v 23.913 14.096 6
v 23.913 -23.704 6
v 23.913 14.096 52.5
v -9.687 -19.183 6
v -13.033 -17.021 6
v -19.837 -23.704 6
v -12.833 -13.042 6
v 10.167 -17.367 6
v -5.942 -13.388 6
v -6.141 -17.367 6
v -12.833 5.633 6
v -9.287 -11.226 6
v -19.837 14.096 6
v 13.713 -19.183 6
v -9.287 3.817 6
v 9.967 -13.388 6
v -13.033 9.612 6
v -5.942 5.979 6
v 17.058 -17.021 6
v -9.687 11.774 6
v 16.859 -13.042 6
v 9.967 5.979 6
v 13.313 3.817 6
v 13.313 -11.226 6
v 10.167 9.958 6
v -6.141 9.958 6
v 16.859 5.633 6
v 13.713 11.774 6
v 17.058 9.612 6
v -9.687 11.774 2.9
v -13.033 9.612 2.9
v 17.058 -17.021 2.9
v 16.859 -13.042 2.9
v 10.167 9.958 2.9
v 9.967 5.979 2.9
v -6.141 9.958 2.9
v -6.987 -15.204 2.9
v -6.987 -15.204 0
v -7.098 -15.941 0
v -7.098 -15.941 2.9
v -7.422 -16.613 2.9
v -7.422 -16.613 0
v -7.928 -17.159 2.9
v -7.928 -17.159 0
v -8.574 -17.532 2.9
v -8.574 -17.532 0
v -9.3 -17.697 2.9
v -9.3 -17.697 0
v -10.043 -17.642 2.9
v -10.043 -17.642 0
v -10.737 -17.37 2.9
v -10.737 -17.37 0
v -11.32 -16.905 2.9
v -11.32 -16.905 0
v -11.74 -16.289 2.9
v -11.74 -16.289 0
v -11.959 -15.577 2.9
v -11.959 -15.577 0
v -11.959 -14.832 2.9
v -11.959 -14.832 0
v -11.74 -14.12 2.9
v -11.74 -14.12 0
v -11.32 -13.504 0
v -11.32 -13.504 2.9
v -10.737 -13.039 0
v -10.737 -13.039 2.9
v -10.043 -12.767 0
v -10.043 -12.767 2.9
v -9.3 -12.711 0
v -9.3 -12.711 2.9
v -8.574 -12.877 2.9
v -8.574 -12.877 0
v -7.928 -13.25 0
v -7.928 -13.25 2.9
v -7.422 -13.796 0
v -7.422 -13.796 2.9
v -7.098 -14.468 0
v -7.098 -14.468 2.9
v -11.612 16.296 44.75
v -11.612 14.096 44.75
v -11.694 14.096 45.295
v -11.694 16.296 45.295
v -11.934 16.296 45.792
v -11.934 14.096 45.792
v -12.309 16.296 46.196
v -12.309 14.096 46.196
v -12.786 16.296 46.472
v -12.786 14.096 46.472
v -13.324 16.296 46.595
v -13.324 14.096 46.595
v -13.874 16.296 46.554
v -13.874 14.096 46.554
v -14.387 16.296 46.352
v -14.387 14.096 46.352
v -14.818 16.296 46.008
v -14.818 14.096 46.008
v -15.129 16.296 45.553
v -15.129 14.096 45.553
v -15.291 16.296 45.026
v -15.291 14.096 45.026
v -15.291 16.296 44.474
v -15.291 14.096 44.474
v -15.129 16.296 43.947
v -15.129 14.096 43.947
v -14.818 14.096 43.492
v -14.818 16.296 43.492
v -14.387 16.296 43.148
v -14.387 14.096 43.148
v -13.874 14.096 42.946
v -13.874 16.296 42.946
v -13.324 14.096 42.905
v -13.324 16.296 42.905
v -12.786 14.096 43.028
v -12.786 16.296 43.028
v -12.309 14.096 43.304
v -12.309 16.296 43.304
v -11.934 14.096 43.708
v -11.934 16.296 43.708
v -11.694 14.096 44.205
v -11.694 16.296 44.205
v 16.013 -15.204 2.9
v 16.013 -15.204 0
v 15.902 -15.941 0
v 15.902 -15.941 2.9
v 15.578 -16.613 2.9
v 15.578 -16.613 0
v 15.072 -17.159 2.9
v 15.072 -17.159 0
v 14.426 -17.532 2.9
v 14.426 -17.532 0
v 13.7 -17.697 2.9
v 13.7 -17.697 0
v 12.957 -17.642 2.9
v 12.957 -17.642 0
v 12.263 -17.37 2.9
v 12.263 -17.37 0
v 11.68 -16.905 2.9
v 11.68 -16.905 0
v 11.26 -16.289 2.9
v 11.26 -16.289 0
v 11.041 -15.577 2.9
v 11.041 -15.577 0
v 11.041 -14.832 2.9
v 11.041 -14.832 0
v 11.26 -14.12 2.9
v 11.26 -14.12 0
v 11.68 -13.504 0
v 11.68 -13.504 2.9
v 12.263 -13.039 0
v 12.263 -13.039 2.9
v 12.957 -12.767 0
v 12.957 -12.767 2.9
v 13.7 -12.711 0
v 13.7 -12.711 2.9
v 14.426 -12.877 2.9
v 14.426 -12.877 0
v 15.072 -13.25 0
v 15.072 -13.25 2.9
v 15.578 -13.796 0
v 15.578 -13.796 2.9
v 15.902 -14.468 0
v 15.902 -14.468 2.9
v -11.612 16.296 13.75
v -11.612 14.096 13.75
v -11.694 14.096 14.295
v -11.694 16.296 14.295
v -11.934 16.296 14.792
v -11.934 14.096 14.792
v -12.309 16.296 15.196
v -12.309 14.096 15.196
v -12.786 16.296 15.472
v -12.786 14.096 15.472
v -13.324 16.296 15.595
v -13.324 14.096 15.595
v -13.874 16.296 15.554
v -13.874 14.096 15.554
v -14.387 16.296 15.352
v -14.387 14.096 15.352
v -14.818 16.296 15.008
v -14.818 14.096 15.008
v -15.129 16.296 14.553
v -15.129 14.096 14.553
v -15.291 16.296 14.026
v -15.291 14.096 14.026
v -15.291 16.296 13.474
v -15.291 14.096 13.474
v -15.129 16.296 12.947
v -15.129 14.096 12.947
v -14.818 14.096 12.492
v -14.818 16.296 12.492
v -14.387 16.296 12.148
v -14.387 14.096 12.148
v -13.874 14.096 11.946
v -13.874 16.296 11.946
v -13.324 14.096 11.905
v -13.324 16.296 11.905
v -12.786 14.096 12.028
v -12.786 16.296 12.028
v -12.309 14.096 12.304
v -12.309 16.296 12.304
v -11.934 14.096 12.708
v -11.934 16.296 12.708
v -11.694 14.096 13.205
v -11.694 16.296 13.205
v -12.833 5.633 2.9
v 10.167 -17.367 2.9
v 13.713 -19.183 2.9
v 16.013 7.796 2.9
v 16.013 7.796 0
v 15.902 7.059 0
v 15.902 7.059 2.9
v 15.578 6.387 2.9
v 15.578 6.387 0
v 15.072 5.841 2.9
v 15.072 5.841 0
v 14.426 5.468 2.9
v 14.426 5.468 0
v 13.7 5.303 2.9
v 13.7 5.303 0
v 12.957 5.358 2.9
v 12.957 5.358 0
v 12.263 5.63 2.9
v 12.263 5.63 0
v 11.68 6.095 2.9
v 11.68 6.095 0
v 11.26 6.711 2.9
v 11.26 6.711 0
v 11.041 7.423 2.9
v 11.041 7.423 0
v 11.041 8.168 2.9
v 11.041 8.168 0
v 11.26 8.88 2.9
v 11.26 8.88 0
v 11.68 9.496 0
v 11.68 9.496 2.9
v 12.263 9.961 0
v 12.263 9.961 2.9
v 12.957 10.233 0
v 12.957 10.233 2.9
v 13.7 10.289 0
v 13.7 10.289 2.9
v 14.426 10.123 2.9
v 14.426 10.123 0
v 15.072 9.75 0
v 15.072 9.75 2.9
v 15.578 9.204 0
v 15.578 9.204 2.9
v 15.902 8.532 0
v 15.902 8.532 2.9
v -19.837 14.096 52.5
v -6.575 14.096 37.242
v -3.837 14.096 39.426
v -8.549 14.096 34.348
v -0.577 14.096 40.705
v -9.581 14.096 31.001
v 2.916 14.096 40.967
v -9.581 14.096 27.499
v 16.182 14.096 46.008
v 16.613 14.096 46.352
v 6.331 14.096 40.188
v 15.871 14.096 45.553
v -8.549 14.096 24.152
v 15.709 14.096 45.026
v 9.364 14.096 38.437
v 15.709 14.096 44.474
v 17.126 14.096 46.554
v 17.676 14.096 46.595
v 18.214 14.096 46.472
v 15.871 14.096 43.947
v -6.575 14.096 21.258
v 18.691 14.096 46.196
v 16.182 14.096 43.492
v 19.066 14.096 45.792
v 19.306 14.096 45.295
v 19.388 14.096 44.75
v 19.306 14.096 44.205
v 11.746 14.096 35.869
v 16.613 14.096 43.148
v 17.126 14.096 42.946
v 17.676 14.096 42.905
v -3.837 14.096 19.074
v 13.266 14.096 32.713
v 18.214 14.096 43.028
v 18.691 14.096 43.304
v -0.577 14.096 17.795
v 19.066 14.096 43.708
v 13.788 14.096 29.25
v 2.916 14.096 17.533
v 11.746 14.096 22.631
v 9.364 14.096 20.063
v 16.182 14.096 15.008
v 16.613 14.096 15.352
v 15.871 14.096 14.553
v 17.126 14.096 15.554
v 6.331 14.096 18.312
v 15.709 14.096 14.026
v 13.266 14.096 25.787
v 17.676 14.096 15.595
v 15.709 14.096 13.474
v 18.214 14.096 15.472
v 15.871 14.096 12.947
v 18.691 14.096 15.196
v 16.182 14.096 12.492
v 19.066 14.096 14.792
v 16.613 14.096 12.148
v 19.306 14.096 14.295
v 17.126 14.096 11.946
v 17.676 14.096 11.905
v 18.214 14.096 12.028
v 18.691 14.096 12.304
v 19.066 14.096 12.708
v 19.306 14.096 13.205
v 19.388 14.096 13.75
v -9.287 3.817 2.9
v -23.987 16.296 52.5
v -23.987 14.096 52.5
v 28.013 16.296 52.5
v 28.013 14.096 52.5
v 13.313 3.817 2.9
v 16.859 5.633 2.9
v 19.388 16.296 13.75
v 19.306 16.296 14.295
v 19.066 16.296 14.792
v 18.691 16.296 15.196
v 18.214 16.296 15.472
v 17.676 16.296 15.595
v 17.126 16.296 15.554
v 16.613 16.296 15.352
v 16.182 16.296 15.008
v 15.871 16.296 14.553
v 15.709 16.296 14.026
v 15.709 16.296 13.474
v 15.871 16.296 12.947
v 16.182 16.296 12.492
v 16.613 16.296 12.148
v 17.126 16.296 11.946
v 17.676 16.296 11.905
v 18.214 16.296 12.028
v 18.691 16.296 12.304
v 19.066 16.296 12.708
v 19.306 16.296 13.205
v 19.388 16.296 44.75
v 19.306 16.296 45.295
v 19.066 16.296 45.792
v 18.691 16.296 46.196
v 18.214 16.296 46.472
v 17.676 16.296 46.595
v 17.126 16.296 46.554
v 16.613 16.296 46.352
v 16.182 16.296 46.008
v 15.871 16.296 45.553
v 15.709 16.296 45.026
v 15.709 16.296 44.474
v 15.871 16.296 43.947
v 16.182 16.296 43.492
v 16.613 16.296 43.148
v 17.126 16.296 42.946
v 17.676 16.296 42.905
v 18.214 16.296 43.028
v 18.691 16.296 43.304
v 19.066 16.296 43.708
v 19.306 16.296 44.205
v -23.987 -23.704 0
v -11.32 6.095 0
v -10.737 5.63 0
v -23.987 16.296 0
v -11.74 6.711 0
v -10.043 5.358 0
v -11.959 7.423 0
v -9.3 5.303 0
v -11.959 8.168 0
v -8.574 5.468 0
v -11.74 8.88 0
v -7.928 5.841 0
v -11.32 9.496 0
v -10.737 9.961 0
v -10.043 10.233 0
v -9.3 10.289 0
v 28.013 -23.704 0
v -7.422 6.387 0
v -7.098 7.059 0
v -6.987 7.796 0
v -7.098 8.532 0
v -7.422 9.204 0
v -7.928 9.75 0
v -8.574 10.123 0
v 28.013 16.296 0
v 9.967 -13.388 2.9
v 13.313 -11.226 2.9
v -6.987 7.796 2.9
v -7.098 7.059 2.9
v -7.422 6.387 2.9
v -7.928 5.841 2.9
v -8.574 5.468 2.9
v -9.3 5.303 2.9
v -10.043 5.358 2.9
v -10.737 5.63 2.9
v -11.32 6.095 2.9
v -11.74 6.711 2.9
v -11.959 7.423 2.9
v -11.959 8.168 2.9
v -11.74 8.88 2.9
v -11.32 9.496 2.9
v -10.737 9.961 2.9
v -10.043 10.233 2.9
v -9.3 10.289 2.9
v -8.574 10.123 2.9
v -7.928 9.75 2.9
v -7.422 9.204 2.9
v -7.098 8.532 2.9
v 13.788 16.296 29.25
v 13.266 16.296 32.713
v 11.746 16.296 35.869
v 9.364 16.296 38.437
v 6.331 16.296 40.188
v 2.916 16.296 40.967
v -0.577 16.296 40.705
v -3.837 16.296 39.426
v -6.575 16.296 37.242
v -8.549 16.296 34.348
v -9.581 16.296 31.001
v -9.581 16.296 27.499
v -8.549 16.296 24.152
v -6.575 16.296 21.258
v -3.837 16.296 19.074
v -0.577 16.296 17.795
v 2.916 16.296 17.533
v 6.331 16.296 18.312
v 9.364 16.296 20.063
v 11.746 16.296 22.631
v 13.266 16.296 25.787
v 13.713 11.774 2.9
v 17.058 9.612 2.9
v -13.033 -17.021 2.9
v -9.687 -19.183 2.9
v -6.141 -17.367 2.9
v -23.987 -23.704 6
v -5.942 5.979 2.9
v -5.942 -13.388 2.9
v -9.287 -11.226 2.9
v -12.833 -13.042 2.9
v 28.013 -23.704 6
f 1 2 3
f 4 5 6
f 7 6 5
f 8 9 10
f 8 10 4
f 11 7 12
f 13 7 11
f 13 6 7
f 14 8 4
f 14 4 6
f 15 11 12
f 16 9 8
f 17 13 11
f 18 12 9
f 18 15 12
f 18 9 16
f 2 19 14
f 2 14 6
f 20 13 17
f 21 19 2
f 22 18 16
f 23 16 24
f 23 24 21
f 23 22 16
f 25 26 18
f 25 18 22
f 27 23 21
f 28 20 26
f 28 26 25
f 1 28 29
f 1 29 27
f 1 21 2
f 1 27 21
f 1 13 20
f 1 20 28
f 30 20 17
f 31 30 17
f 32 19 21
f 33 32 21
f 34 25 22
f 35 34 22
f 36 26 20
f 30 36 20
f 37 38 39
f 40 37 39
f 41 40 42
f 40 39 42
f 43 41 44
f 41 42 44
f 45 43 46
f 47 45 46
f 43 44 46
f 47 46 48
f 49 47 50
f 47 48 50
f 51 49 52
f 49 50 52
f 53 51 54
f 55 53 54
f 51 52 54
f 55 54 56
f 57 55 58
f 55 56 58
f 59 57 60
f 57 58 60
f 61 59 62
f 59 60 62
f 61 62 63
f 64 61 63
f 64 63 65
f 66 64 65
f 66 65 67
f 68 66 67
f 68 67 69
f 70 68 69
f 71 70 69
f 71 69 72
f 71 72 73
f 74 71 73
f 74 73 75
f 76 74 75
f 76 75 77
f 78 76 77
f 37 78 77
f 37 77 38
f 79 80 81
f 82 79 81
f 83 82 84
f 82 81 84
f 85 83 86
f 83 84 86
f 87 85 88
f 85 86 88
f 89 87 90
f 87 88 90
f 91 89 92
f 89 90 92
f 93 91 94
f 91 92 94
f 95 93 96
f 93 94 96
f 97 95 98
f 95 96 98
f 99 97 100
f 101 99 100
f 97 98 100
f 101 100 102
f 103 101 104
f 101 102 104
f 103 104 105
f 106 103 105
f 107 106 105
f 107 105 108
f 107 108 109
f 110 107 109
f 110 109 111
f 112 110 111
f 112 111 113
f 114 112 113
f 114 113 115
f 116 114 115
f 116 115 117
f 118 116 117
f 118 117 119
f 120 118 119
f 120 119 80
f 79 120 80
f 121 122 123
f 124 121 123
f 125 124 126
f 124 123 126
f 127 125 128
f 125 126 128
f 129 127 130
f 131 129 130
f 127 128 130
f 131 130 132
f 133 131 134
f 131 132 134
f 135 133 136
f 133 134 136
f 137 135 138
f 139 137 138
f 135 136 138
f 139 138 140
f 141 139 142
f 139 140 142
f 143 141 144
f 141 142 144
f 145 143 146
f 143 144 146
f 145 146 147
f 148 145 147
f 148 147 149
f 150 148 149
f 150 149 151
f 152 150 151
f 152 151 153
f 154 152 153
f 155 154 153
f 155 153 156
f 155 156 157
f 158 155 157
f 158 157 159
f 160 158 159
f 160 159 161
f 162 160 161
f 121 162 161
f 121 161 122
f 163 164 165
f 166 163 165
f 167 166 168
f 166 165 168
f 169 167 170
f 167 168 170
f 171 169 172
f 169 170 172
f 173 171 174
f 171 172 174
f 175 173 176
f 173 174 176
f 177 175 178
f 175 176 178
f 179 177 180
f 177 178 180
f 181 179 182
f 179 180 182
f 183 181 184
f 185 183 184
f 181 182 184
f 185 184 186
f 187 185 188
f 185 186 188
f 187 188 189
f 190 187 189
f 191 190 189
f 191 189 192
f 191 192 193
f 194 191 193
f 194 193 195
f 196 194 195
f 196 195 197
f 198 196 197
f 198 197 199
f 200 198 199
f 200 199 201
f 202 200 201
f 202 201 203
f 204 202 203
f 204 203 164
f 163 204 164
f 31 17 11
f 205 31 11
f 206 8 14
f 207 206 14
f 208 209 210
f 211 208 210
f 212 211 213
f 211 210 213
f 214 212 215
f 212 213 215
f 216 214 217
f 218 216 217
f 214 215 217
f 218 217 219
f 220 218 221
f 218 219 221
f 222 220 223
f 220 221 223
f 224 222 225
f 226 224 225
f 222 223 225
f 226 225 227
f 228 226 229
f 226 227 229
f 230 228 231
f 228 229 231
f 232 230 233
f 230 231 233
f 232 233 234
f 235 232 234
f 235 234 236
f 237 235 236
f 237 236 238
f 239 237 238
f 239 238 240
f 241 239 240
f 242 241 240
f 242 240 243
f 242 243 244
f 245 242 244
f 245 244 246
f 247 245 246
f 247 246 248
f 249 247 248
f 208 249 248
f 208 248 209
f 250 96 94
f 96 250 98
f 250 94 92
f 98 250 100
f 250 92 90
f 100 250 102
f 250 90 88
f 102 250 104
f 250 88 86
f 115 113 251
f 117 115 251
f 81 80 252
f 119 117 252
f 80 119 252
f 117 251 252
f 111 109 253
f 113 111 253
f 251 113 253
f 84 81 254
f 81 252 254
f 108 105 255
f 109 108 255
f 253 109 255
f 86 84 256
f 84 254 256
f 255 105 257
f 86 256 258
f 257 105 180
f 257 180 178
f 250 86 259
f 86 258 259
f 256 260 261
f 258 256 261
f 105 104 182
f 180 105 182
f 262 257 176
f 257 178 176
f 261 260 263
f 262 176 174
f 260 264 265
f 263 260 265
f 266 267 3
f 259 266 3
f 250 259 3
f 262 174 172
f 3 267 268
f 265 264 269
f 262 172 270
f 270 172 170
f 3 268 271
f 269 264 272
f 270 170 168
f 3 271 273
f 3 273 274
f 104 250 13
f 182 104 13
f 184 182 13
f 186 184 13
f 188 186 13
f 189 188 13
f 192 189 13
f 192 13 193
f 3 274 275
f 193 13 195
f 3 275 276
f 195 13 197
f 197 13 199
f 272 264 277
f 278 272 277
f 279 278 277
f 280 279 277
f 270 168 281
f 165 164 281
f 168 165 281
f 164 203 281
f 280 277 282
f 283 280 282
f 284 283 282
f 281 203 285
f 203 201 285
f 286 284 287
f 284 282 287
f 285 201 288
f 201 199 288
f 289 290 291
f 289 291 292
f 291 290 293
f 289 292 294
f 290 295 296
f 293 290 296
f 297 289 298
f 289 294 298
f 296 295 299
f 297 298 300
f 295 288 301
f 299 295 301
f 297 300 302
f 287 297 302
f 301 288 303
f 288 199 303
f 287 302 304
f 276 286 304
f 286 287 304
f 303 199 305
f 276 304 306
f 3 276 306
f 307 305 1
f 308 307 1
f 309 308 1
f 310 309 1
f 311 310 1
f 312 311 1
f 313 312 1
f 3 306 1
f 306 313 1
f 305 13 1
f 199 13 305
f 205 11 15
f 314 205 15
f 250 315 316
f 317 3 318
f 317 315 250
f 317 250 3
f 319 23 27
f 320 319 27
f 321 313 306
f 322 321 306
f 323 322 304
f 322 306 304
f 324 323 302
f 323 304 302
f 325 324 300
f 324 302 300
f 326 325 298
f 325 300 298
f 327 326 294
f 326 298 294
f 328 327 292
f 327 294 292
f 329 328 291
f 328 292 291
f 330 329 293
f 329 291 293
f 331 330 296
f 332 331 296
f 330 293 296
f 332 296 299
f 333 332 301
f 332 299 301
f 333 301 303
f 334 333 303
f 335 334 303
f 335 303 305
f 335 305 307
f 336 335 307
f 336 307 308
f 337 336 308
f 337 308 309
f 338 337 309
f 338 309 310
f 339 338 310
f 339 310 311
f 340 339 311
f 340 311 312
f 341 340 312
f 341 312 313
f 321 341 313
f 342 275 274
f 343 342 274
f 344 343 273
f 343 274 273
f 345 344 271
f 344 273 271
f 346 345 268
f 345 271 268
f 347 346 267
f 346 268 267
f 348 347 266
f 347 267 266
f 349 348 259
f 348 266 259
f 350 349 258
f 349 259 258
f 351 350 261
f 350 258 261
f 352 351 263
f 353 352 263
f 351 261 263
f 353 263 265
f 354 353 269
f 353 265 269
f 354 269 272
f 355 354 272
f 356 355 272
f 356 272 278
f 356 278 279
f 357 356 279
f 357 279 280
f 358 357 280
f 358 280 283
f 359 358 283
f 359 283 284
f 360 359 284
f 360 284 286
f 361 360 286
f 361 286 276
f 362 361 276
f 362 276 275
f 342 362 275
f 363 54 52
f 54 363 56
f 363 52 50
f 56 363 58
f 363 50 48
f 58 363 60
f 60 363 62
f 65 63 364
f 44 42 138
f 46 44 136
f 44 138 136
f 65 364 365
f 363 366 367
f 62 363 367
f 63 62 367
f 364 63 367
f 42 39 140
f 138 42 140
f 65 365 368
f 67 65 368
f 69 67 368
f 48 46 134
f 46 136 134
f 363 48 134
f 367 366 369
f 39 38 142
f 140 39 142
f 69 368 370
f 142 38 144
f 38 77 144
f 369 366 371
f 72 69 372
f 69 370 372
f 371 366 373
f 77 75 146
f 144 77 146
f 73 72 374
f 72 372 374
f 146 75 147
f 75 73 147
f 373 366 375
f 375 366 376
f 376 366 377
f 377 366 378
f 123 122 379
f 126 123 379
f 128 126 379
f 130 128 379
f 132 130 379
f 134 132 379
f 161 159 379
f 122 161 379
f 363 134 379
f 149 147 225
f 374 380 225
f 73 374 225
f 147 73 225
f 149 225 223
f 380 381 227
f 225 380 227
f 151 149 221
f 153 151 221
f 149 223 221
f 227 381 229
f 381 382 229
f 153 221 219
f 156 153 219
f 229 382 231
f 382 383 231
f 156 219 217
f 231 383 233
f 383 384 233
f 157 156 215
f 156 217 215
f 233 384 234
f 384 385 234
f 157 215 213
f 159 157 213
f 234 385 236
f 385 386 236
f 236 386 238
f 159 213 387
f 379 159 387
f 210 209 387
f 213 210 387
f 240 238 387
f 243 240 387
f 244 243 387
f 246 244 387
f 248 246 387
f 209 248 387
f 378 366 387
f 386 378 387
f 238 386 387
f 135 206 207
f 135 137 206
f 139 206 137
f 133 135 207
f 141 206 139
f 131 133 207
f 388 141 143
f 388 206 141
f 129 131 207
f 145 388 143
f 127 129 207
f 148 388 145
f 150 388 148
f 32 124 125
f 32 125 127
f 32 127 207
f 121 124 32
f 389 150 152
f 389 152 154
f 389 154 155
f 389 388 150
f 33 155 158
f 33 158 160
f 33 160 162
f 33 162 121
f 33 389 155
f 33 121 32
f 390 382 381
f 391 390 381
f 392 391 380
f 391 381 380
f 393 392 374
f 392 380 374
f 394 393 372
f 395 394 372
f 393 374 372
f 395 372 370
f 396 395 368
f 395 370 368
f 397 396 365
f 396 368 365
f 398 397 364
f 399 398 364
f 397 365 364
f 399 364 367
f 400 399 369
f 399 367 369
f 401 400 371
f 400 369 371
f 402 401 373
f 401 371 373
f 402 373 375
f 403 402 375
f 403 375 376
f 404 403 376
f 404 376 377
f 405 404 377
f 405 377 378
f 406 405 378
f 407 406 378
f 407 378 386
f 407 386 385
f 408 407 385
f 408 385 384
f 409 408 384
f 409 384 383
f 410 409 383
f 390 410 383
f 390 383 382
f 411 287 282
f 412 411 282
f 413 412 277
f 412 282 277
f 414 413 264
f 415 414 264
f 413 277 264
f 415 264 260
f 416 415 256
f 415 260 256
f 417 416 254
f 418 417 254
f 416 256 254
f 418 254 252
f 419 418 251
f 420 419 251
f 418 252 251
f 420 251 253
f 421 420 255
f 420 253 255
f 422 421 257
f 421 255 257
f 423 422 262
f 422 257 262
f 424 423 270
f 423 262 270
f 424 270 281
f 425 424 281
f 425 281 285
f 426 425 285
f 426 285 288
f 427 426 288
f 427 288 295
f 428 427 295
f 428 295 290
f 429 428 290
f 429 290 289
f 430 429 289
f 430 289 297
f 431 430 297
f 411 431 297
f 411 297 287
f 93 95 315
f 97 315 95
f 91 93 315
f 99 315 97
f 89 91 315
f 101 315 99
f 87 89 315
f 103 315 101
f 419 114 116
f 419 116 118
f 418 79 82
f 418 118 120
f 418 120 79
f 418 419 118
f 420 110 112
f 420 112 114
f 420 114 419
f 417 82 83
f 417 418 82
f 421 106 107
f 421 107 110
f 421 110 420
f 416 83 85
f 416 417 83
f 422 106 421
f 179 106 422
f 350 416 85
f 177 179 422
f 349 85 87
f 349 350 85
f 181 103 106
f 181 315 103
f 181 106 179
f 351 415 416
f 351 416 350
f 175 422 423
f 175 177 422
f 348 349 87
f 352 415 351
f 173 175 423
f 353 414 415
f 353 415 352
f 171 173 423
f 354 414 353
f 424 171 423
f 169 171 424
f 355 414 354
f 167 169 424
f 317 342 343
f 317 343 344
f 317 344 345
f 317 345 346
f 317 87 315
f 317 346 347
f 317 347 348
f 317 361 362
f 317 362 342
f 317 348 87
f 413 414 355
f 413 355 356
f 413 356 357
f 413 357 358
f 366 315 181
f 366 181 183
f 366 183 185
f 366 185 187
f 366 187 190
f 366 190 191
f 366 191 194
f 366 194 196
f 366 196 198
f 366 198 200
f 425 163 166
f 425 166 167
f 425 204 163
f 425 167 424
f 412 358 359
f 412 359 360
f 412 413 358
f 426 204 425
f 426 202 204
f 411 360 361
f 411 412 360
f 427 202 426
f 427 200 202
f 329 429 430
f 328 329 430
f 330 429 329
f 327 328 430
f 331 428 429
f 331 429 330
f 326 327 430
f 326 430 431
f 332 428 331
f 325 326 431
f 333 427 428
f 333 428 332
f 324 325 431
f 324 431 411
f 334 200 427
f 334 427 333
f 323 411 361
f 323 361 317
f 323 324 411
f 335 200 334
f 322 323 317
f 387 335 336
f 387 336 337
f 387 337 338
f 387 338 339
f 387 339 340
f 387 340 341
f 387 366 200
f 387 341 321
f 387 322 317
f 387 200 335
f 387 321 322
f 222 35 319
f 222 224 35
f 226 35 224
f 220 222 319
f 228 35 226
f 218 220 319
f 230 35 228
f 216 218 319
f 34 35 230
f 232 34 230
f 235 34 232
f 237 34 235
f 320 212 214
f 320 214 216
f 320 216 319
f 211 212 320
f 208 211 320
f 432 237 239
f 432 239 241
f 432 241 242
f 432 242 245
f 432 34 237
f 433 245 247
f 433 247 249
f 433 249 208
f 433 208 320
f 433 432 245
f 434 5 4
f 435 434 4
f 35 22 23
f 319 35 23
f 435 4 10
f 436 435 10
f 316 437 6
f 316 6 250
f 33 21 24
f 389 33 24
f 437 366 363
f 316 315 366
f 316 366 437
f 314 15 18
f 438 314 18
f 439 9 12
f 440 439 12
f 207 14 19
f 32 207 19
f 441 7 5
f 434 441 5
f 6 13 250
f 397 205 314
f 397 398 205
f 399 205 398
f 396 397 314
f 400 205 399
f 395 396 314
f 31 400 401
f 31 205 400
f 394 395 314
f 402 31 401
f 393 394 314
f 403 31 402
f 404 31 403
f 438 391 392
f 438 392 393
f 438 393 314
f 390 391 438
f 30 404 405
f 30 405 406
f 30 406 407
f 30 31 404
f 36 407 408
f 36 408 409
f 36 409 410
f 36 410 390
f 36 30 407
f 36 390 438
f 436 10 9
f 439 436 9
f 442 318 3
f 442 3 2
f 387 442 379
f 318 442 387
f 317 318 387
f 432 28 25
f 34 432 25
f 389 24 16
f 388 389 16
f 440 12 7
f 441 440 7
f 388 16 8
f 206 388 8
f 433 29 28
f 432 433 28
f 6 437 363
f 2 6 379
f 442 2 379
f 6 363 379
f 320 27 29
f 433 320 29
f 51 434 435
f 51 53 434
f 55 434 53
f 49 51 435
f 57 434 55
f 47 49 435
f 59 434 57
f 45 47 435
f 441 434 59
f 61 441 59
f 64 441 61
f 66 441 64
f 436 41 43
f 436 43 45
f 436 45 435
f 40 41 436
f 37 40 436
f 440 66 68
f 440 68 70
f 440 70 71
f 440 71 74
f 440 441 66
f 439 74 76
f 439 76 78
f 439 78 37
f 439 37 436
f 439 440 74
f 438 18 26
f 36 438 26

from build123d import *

# Parameters (mm, degrees)
F0_W      = 52
F0_H      = 40
F1_DEPTH  = 6
F2_W      = 52
F2_H      = 2.2
F3_DEPTH  = 46.5
F5_DEPTH  = 4.1
F7_DEPTH  = 4.15
F8_R      = 11.75
F8_R_2    = 1.85
F9_DEPTH  = 25
F10_R     = 2.5
F11_DEPTH = 25
F13_DEPTH = 3.1


with BuildPart() as f1:
    # F0 (on Top) → F1 (new body)
    with BuildSketch(Plane.XY):
        with Locations((2.012877, -3.704458)):
            Rectangle(F0_W, F0_H)
    extrude(amount=F1_DEPTH)

    # F2 (on face) → F3 (join)
    with BuildSketch(Plane.XY.offset(6)):
        with Locations((2.012877, 15.195542)):
            Rectangle(F2_W, F2_H)
    extrude(amount=F3_DEPTH)

    # F4 (on face) → F5 (join)
    with BuildSketch(Plane.YZ.offset(28.012877)):
        Polygon((14.095542, 52.5), (-23.704458, 6), (14.095542, 6), align=None)
    extrude(amount=-F5_DEPTH)

    # F6 (on face) → F7 (join)
    with BuildSketch(Plane(origin=(-23.987123, 0, 0), x_dir=(0, -1, 0), z_dir=(-1, 0, 0))):
        Polygon((23.704458, 6), (-14.095542, 52.5), (-14.095542, 6), align=None)
    extrude(amount=-F7_DEPTH)

    # F8 (on face) → F9 (cut)
    with BuildSketch(Plane.XZ.offset(-14.095542)):
        with Locations((2.037877, 29.25)):
            Circle(F8_R)
        with Locations((17.537877, 44.75)):
            Circle(F8_R_2)
        with Locations((-13.462123, 44.75)):
            Circle(F8_R_2)
        with Locations((-13.462123, 13.75)):
            Circle(F8_R_2)
        with Locations((17.537877, 13.75)):
            Circle(F8_R_2)
    extrude(amount=-F9_DEPTH, mode=Mode.SUBTRACT)

    # F10 (on face) → F11 (cut)
    with BuildSketch(Plane(origin=(0, 0, 0), x_dir=(1, 0, 0), z_dir=(0, 0, -1))):
        with Locations((13.512877, 15.204458)):
            Circle(F10_R)
        with Locations((-9.487123, 15.204458)):
            Circle(F10_R)
        with Locations((-9.487123, -7.795542)):
            Circle(F10_R)
        with Locations((13.512877, -7.795542)):
            Circle(F10_R)
    extrude(amount=-F11_DEPTH, mode=Mode.SUBTRACT)

    # F12 (on face) → F13 (cut)
    with BuildSketch(Plane.XY.offset(6)):
        Polygon((13.312949, -11.225761), (9.96726, -13.388251), (10.167187, -17.366948), (13.712804, -19.183154), (17.058493, -17.020664), (16.858566, -13.041967), align=None)
        Polygon((13.712804, 11.774239), (10.167187, 9.958033), (9.96726, 5.979336), (13.312949, 3.816846), (16.858566, 5.633052), (17.058493, 9.611749), align=None)
        Polygon((-13.03274, -17.020664), (-9.687051, -19.183154), (-6.141434, -17.366948), (-5.941507, -13.388251), (-9.287196, -11.225761), (-12.832813, -13.041967), align=None)
        Polygon((-5.941507, 5.979336), (-6.141434, 9.958033), (-9.687051, 11.774239), (-13.03274, 9.611749), (-12.832813, 5.633052), (-9.287196, 3.816846), align=None)
    extrude(amount=-F13_DEPTH, mode=Mode.SUBTRACT)


solid = f1.part
